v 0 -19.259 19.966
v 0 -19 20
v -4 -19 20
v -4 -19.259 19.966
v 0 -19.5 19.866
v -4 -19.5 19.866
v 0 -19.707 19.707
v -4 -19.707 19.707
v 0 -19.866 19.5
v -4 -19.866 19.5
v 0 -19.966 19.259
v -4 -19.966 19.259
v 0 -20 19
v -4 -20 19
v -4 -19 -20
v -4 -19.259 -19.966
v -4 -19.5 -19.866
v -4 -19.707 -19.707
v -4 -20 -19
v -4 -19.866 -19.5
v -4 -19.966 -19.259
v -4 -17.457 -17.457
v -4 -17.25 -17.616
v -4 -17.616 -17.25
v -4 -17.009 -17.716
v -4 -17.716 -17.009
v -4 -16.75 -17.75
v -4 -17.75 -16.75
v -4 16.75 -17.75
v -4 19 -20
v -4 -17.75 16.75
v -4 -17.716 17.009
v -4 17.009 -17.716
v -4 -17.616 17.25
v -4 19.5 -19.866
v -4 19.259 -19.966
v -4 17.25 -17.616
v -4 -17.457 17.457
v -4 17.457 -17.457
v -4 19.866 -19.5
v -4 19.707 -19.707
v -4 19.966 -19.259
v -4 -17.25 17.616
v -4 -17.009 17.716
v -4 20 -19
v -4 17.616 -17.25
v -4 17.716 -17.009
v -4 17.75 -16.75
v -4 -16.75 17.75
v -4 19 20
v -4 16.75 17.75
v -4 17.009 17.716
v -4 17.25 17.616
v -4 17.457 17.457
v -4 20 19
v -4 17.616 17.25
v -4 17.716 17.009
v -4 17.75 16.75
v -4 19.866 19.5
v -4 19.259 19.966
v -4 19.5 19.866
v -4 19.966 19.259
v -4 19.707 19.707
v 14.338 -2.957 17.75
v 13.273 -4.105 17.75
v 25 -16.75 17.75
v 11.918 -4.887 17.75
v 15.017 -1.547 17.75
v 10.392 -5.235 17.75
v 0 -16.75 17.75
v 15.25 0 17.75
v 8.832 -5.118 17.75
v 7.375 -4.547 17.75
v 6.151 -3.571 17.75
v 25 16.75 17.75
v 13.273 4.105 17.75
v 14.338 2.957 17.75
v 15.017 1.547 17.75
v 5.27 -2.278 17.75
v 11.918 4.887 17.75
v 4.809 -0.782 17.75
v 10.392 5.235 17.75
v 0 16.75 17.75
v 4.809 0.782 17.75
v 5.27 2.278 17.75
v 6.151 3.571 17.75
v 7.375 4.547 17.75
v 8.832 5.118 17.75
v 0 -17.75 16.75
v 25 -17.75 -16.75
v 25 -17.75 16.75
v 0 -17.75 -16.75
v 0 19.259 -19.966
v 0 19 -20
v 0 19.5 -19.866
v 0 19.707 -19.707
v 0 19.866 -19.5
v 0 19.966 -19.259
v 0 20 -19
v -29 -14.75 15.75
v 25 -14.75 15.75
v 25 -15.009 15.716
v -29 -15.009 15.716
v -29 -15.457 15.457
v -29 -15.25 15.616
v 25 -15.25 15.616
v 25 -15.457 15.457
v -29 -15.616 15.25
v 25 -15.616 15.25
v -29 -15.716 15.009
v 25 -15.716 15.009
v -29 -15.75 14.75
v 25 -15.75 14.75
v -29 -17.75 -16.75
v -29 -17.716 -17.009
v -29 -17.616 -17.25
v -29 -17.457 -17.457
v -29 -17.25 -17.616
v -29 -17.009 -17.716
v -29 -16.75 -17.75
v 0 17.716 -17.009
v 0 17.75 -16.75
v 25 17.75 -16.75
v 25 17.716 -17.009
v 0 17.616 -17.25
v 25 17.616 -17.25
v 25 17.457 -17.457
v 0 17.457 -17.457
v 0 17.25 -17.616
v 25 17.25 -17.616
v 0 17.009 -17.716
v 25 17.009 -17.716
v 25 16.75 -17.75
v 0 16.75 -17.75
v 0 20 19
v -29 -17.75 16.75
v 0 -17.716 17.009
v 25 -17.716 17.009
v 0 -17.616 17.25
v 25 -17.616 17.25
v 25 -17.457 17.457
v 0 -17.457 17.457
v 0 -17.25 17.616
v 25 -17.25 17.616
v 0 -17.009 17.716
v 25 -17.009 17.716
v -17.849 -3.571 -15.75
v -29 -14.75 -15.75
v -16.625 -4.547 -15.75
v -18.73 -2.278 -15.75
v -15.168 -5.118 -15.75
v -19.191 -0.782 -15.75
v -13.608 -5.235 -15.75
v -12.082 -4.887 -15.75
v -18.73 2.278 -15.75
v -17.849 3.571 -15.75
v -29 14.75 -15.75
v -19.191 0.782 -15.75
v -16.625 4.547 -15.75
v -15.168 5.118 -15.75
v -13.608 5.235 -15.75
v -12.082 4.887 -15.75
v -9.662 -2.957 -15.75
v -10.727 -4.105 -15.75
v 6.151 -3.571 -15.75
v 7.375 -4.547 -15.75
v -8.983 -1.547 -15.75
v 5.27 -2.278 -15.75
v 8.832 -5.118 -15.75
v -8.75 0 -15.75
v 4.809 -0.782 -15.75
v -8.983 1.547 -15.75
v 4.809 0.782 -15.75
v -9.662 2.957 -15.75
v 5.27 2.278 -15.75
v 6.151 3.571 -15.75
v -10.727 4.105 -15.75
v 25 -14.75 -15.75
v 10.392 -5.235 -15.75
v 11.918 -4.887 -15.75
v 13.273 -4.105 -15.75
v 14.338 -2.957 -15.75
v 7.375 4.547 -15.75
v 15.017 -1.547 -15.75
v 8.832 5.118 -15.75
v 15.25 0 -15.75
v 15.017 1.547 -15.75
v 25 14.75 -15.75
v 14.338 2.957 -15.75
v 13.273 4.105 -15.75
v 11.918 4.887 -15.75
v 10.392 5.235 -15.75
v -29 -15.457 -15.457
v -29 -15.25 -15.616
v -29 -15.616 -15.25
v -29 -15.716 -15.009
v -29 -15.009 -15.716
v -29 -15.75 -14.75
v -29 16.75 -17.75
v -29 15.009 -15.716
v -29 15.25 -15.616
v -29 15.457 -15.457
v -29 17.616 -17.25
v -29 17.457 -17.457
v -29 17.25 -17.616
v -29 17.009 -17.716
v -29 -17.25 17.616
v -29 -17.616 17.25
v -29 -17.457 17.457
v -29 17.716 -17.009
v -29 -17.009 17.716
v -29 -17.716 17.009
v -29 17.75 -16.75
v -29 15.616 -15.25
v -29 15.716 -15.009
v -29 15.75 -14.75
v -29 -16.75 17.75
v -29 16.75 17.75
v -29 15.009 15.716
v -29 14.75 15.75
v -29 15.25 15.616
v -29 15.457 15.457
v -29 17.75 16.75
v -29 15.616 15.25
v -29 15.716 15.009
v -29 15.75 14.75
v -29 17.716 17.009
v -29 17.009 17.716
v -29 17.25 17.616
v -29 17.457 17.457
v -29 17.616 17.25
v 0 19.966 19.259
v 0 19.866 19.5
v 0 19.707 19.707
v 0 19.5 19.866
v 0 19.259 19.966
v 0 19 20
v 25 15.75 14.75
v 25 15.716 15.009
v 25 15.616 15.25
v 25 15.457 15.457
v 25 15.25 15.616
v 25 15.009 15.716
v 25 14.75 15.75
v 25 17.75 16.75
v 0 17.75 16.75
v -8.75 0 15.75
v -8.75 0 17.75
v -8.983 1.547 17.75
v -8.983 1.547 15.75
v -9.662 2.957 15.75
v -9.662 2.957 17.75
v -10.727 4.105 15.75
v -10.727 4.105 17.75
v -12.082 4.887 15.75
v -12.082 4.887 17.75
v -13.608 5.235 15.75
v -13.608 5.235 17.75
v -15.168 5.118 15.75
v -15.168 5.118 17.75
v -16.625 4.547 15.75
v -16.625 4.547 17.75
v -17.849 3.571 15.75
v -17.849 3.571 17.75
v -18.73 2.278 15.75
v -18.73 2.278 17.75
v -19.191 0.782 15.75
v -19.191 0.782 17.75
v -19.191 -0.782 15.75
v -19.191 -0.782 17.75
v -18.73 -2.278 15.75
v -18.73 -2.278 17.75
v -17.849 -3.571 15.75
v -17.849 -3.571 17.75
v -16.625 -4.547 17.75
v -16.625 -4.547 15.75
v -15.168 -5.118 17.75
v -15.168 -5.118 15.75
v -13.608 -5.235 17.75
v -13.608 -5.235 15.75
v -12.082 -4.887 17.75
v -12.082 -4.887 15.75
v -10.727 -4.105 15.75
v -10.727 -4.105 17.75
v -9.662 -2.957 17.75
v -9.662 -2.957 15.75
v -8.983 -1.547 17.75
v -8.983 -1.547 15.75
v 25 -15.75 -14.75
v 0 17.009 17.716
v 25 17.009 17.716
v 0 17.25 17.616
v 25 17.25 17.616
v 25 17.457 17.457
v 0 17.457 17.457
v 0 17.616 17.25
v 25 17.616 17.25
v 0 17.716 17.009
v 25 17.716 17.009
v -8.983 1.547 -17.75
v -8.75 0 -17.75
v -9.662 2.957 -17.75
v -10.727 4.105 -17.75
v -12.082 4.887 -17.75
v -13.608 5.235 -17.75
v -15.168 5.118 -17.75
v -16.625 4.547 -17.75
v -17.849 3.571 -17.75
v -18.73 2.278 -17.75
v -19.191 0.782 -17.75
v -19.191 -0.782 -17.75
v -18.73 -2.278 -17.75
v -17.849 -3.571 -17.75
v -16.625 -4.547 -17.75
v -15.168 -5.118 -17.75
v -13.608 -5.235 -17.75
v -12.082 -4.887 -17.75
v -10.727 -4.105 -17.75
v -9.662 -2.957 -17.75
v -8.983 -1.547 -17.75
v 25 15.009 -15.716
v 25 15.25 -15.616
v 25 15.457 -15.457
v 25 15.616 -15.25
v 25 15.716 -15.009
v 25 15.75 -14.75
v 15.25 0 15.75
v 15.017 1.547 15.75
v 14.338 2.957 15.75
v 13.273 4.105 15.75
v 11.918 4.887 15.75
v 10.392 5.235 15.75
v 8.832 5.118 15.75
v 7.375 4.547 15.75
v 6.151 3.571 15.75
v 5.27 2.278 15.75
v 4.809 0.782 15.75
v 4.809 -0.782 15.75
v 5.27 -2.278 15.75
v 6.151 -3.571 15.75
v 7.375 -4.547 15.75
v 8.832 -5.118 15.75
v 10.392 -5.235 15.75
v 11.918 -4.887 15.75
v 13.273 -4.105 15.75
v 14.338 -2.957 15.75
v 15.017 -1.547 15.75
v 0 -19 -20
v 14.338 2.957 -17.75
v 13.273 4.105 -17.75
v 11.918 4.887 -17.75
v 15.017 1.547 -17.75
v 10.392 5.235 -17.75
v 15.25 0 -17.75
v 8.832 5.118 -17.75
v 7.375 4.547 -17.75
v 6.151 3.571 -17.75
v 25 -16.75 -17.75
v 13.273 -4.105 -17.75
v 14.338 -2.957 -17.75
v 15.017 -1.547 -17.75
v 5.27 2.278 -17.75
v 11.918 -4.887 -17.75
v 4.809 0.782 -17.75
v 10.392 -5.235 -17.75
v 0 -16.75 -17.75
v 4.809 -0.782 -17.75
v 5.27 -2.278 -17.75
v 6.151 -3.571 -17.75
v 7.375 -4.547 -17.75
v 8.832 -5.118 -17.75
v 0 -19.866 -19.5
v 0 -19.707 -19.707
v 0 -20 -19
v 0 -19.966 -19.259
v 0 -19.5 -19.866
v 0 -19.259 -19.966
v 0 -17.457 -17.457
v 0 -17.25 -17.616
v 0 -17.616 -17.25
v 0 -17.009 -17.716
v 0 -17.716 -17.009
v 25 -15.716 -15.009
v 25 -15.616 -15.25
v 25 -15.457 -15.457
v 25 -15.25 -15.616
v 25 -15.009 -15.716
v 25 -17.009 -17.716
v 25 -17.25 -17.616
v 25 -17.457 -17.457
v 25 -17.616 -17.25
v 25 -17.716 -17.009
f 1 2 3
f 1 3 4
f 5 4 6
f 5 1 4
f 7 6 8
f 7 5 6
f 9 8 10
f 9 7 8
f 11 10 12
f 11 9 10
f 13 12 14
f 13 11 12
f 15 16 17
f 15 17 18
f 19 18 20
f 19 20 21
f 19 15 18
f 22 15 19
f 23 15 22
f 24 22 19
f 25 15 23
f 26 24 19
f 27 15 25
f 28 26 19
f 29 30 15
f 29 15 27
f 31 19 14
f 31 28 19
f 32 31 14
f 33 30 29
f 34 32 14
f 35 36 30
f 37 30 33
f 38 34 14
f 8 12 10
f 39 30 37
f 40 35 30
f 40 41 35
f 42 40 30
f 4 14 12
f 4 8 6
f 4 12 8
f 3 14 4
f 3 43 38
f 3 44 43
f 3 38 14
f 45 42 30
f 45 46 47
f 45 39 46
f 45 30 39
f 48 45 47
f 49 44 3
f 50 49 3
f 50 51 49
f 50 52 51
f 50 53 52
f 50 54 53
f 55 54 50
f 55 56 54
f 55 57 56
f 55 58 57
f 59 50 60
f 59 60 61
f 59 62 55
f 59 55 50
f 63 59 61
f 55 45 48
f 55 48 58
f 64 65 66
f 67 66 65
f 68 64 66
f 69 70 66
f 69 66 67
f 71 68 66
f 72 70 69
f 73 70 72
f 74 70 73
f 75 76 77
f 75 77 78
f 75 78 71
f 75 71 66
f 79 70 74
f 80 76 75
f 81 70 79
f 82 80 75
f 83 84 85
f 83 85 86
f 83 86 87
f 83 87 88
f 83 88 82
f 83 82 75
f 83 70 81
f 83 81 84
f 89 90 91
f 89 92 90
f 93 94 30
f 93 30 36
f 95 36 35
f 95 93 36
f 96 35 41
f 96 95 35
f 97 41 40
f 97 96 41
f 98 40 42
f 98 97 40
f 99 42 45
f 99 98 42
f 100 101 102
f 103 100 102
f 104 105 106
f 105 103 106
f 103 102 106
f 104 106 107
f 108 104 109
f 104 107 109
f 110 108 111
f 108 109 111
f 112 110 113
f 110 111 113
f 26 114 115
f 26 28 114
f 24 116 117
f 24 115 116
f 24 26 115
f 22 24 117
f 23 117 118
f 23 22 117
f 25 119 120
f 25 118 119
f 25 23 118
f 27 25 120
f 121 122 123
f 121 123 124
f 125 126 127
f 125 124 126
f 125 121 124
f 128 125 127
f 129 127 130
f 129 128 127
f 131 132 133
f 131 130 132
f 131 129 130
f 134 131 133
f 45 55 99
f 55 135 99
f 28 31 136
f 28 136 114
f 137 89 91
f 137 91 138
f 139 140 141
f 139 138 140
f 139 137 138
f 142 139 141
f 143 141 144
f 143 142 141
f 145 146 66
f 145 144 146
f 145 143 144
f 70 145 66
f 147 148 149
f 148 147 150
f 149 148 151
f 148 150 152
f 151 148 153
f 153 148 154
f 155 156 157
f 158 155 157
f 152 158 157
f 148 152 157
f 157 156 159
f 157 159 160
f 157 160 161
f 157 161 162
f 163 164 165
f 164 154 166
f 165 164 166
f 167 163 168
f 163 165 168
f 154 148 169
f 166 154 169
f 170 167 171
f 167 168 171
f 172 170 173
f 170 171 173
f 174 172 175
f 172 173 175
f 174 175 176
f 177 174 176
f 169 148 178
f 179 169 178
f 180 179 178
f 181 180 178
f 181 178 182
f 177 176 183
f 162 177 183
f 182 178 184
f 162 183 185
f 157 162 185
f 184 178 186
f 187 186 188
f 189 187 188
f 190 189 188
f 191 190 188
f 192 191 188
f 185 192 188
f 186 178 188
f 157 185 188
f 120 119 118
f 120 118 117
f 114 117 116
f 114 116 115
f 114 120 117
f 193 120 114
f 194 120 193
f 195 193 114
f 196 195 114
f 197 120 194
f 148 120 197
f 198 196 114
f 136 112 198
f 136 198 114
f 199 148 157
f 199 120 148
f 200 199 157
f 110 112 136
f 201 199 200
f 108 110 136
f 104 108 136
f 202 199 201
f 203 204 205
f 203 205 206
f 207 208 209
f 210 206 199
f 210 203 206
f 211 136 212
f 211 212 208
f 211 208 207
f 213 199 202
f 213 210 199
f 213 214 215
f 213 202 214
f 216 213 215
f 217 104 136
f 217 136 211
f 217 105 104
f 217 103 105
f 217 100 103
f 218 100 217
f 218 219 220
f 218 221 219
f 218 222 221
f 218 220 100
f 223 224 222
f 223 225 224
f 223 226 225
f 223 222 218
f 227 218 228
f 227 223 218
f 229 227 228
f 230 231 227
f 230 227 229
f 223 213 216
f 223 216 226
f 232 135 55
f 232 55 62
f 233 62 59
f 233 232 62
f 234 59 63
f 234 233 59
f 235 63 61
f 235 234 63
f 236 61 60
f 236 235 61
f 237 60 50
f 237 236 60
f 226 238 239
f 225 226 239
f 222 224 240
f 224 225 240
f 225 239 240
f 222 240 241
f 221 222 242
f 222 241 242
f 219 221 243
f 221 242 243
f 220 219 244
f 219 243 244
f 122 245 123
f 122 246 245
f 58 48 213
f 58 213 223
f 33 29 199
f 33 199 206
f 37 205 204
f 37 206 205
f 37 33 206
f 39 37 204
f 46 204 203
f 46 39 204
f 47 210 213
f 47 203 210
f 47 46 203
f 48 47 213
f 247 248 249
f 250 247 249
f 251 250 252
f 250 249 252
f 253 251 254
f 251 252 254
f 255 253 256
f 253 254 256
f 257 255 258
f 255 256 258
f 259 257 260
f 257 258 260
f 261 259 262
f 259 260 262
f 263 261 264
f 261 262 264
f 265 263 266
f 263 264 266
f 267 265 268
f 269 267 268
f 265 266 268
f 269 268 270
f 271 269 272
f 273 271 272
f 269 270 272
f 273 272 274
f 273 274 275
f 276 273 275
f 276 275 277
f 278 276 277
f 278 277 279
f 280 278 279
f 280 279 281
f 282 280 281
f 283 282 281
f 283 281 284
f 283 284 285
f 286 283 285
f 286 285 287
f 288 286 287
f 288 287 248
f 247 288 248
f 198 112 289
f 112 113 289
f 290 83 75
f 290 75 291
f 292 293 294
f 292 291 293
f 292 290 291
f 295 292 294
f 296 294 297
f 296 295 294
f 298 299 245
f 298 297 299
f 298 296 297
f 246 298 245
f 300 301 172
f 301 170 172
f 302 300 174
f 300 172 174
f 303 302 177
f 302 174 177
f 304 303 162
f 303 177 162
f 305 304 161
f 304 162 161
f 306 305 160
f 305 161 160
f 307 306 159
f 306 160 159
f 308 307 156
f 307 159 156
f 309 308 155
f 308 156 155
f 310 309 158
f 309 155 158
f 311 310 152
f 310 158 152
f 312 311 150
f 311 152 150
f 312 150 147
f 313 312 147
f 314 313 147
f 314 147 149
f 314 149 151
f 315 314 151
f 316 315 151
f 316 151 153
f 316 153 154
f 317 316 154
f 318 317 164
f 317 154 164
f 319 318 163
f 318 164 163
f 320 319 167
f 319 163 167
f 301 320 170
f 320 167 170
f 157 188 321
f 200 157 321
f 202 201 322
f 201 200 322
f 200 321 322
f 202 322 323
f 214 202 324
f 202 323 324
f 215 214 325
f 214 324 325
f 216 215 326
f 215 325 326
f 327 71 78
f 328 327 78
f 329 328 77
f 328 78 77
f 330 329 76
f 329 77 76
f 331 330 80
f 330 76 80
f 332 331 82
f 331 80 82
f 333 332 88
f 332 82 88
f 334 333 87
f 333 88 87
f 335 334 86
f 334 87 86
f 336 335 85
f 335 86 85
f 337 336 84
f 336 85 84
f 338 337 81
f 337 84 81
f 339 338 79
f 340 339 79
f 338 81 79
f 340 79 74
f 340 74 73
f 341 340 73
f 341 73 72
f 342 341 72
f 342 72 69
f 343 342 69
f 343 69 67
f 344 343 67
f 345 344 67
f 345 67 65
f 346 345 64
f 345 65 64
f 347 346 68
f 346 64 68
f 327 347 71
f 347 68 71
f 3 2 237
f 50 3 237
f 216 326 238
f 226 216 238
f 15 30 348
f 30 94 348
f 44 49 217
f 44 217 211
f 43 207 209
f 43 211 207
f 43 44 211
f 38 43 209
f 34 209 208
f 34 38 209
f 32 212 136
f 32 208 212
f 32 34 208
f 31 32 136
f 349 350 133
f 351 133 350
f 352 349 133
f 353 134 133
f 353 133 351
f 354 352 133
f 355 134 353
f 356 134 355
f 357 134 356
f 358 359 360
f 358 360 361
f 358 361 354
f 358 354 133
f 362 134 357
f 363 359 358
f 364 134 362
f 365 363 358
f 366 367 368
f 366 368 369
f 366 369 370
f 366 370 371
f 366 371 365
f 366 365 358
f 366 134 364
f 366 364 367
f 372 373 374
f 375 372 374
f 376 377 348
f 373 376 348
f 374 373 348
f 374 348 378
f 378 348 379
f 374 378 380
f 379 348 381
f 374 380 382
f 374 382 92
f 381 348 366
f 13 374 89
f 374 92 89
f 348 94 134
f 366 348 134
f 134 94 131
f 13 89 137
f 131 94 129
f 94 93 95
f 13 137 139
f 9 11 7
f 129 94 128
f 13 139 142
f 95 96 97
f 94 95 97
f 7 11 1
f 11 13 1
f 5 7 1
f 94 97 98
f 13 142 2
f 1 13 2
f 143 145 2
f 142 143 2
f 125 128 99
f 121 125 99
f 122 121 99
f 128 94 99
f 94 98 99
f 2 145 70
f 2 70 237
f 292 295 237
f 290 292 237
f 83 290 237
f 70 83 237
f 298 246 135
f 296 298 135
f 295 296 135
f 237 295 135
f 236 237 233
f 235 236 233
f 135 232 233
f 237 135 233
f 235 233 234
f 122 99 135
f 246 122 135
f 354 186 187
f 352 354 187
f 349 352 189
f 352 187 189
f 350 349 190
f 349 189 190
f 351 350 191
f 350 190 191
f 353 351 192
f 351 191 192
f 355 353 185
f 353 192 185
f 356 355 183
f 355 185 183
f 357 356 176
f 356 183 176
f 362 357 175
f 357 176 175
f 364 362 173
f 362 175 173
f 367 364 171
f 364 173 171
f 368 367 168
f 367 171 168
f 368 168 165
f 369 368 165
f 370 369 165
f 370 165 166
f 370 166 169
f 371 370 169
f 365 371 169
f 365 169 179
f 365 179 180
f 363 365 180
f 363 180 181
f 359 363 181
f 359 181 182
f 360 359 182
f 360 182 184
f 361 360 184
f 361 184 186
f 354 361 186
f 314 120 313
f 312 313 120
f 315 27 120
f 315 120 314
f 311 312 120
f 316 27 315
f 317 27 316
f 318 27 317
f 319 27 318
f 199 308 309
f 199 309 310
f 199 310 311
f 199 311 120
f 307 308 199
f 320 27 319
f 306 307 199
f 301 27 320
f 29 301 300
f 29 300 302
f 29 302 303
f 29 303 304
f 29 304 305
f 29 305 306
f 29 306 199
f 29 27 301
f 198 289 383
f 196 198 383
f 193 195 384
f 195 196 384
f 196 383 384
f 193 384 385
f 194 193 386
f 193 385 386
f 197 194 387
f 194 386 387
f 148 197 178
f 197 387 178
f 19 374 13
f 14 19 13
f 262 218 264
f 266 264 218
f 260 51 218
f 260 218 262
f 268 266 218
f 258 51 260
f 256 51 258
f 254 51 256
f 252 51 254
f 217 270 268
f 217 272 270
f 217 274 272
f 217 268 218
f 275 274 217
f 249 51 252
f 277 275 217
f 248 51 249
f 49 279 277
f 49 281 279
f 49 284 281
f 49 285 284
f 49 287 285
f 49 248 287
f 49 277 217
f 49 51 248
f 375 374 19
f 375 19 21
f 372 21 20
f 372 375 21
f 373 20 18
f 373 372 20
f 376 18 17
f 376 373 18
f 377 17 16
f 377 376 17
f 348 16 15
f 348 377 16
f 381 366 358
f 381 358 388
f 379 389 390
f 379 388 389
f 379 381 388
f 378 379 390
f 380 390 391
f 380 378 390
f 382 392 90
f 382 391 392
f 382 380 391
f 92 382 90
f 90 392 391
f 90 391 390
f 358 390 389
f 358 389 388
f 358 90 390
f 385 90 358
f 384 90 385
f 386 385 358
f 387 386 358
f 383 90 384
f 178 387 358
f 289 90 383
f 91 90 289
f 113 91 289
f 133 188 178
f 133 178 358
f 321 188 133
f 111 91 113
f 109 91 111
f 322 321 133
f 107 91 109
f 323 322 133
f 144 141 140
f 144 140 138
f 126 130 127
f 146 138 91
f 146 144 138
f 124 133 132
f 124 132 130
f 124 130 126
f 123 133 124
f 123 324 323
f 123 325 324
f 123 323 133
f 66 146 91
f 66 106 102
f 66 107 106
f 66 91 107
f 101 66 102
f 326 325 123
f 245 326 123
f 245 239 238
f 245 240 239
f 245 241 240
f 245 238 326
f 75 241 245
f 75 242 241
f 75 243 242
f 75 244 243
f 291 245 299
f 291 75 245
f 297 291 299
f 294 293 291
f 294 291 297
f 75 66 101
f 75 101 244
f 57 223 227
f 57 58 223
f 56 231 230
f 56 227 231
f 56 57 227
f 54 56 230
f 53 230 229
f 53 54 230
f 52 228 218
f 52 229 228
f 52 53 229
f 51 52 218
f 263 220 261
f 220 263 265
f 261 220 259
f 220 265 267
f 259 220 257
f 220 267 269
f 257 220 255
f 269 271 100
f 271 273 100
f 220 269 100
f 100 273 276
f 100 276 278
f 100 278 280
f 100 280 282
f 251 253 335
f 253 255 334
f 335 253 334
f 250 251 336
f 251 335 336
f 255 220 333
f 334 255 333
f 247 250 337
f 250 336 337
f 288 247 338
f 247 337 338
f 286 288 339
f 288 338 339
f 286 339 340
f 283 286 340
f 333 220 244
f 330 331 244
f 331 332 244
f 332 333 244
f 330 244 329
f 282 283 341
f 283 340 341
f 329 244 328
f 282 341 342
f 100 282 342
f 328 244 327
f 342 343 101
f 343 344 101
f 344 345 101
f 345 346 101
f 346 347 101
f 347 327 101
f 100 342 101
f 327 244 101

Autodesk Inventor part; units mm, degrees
ref_plane "YZ Plane" through (0, 0, 0) normal (1, 0, 0) x (0, 1, 0)
ref_plane "XZ Plane" through (0, 0, 0) normal (0, 1, 0) x (-1, 0, 0)
ref_plane "XY Plane" through (0, 0, 0) normal (0, 0, 1) x (1, 0, 0)
sketch "Skizze1" plane through (0, 0, 0) normal (1, 0, 0) x (0, 1, 0)
  line L0 (-16.75, 17.75) -> (16.75, 17.75)
  line L1 (17.75, 16.75) -> (17.75, -16.75)
  line L2 (16.75, -17.75) -> (-16.75, -17.75)
  line L3 (-17.75, -16.75) -> (-17.75, 16.75)
  line L4 (-17.75, 17.75) -> (17.75, -17.75) construction
  line L5 (17.75, 17.75) -> (-17.75, -17.75) construction
  line L6 (-14.75, 15.75) -> (14.75, 15.75)
  line L7 (15.75, 14.75) -> (15.75, -14.75)
  line L8 (14.75, -15.75) -> (-14.75, -15.75)
  line L9 (-15.75, -14.75) -> (-15.75, 14.75)
  line L10 (-15.75, 15.75) -> (15.75, -15.75) construction
  line L11 (15.75, 15.75) -> (-15.75, -15.75) construction
  arc A0 (17.75, 16.75) -> (16.75, 17.75) centre (16.75, 16.75) ccw
  arc A1 (-16.75, 17.75) -> (-17.75, 16.75) centre (-16.75, 16.75) ccw
  arc A2 (-17.75, -16.75) -> (-16.75, -17.75) centre (-16.75, -16.75) ccw
  arc A3 (16.75, -17.75) -> (17.75, -16.75) centre (16.75, -16.75) ccw
  arc A4 (14.75, -15.75) -> (15.75, -14.75) centre (14.75, -14.75) ccw
  arc A5 (-15.75, -14.75) -> (-14.75, -15.75) centre (-14.75, -14.75) ccw
  arc A6 (-14.75, 15.75) -> (-15.75, 14.75) centre (-14.75, 14.75) ccw
  arc A7 (15.75, 14.75) -> (14.75, 15.75) centre (14.75, 14.75) ccw
  point P0 (0, 0)
  dimension "d0" = 35.5
  dimension "d1" = 35.5
  dimension "d2" = 31.5
  dimension "d3" = 31.5
  dimension "d4" = 1
extrude "Extrusion1" add sketch "Skizze1" along normal blind 25
sketch "Skizze2" plane through (0, 0, 0) normal (-1, 0, 0) x (0, 0, 1)
  line L0 (19, 20) -> (-19, 20)
  line L1 (-20, 19) -> (-20, -19)
  line L2 (-19, -20) -> (19, -20)
  line L3 (20, -19) -> (20, 19)
  line L4 (20, 20) -> (-20, -20) construction
  line L5 (-20, 20) -> (20, -20) construction
  line L6 (16.75, 17.75) -> (-16.75, 17.75)
  line L7 (-17.75, 16.75) -> (-17.75, -16.75)
  line L8 (-16.75, -17.75) -> (16.75, -17.75)
  line L9 (17.75, -16.75) -> (17.75, 16.75)
  line L10 (17.75, 17.75) -> (-17.75, -17.75) construction
  line L11 (-17.75, 17.75) -> (17.75, -17.75) construction
  arc A0 (19, -20) -> (20, -19) centre (19, -19) ccw
  arc A1 (20, 19) -> (19, 20) centre (19, 19) ccw
  arc A2 (-19, 20) -> (-20, 19) centre (-19, 19) ccw
  arc A3 (-20, -19) -> (-19, -20) centre (-19, -19) ccw
  arc A4 (-17.75, -16.75) -> (-16.75, -17.75) centre (-16.75, -16.75) ccw
  arc A5 (-16.75, 17.75) -> (-17.75, 16.75) centre (-16.75, 16.75) ccw
  arc A6 (17.75, 16.75) -> (16.75, 17.75) centre (16.75, 16.75) ccw
  arc A7 (16.75, -17.75) -> (17.75, -16.75) centre (16.75, -16.75) ccw
  line L12 (-16.75, 17.75) -> (16.75, 17.75)
  line L13 (17.75, 16.75) -> (17.75, -16.75)
  line L14 (16.75, -17.75) -> (-16.75, -17.75)
  line L15 (-17.75, -16.75) -> (-17.75, 16.75)
  line L16 (-17.75, 17.75) -> (17.75, -17.75) construction
  line L17 (17.75, 17.75) -> (-17.75, -17.75) construction
  arc A8 (17.75, 16.75) -> (16.75, 17.75) centre (16.75, 16.75) ccw
  arc A9 (17.75, 16.75) -> (16.75, 17.75) centre (16.75, 16.75) ccw
  arc A10 (16.75, -17.75) -> (17.75, -16.75) centre (16.75, -16.75) ccw
  arc A11 (-16.75, 17.75) -> (-17.75, 16.75) centre (-16.75, 16.75) ccw
  arc A12 (-17.75, -16.75) -> (-16.75, -17.75) centre (-16.75, -16.75) ccw
  point P0 (0, 0)
  dimension "d7" = 40
  dimension "d8" = 40
  dimension "d9" = 1
  dimension "d10" = 1
  dimension "d11" = 1
extrude "Extrusion2" add sketch "Skizze2" along normal blind 4 contours A1 L3 A0 L2 A3 L1 A2 L0 | A6 L9 A7 L8 A4 L7 A5 L6
sketch "Skizze3" plane through (-4, 0, 0) normal (-1, 0, 0) x (0, 0, 1)
  line L0 (-14.75, 15.75) -> (14.75, 15.75)
  line L1 (15.75, 14.75) -> (15.75, -14.75)
  line L2 (14.75, -15.75) -> (-14.75, -15.75)
  line L3 (-15.75, -14.75) -> (-15.75, 14.75)
  line L4 (-15.75, 15.75) -> (15.75, -15.75) construction
  line L5 (15.75, 15.75) -> (-15.75, -15.75) construction
  arc A0 (15.75, 14.75) -> (14.75, 15.75) centre (14.75, 14.75) ccw
  arc A1 (-14.75, 15.75) -> (-15.75, 14.75) centre (-14.75, 14.75) ccw
  arc A2 (-15.75, -14.75) -> (-14.75, -15.75) centre (-14.75, -14.75) ccw
  arc A3 (14.75, -15.75) -> (15.75, -14.75) centre (14.75, -14.75) ccw
  point P0 (0, 0)
  dimension "d14" = 31.5
  dimension "d15" = 1
extrude "Extrusion3" cut sketch "Skizze3" against normal blind 4
sketch "Skizze4" plane through (-4, 0, 0) normal (-1, 0, 0) x (0, 0, 1)
  line L0 (-16.75, 17.75) -> (16.75, 17.75)
  line L1 (17.75, 16.75) -> (17.75, -16.75)
  line L2 (16.75, -17.75) -> (-16.75, -17.75)
  line L3 (-17.75, -16.75) -> (-17.75, 16.75)
  line L4 (-17.75, 17.75) -> (17.75, -17.75) construction
  line L5 (17.75, 17.75) -> (-17.75, -17.75) construction
  line L6 (-14.75, 15.75) -> (14.75, 15.75)
  line L7 (15.75, 14.75) -> (15.75, -14.75)
  line L8 (14.75, -15.75) -> (-14.75, -15.75)
  line L9 (-15.75, -14.75) -> (-15.75, 14.75)
  line L10 (-15.75, 15.75) -> (15.75, -15.75) construction
  line L11 (15.75, 15.75) -> (-15.75, -15.75) construction
  arc A0 (17.75, 16.75) -> (16.75, 17.75) centre (16.75, 16.75) ccw
  arc A1 (16.75, -17.75) -> (17.75, -16.75) centre (16.75, -16.75) ccw
  arc A2 (-17.75, -16.75) -> (-16.75, -17.75) centre (-16.75, -16.75) ccw
  arc A3 (-16.75, 17.75) -> (-17.75, 16.75) centre (-16.75, 16.75) ccw
  arc A4 (-14.75, 15.75) -> (-15.75, 14.75) centre (-14.75, 14.75) ccw
  arc A5 (15.75, 14.75) -> (14.75, 15.75) centre (14.75, 14.75) ccw
  arc A6 (14.75, -15.75) -> (15.75, -14.75) centre (14.75, -14.75) ccw
  arc A7 (-15.75, -14.75) -> (-14.75, -15.75) centre (-14.75, -14.75) ccw
  point P0 (0, 0)
  dimension "d18" = 1
extrude "Extrusion4" add sketch "Skizze4" along normal blind 25
sketch "Skizze5" plane through (25, -16.75, 17.75) normal (0, 0, 1) x (1, 0, 0)
  line L0 (-25, 16.75) -> (-15, 16.75)
  line L1 (-15, 16.75) -> (-39, 16.75)
  circle A0 centre (-15, 16.75) radius 5.25
  circle A1 centre (-39, 16.75) radius 5.25
  dimension "d21" = 10
  dimension "d22" = 24
  dimension "d23" = 10.5
  dimension "d24" = 10.5
extrude "Extrusion5" cut sketch "Skizze5" against normal blind 50
properties part number "Verbinder" material "Edelstahl, 440C"
